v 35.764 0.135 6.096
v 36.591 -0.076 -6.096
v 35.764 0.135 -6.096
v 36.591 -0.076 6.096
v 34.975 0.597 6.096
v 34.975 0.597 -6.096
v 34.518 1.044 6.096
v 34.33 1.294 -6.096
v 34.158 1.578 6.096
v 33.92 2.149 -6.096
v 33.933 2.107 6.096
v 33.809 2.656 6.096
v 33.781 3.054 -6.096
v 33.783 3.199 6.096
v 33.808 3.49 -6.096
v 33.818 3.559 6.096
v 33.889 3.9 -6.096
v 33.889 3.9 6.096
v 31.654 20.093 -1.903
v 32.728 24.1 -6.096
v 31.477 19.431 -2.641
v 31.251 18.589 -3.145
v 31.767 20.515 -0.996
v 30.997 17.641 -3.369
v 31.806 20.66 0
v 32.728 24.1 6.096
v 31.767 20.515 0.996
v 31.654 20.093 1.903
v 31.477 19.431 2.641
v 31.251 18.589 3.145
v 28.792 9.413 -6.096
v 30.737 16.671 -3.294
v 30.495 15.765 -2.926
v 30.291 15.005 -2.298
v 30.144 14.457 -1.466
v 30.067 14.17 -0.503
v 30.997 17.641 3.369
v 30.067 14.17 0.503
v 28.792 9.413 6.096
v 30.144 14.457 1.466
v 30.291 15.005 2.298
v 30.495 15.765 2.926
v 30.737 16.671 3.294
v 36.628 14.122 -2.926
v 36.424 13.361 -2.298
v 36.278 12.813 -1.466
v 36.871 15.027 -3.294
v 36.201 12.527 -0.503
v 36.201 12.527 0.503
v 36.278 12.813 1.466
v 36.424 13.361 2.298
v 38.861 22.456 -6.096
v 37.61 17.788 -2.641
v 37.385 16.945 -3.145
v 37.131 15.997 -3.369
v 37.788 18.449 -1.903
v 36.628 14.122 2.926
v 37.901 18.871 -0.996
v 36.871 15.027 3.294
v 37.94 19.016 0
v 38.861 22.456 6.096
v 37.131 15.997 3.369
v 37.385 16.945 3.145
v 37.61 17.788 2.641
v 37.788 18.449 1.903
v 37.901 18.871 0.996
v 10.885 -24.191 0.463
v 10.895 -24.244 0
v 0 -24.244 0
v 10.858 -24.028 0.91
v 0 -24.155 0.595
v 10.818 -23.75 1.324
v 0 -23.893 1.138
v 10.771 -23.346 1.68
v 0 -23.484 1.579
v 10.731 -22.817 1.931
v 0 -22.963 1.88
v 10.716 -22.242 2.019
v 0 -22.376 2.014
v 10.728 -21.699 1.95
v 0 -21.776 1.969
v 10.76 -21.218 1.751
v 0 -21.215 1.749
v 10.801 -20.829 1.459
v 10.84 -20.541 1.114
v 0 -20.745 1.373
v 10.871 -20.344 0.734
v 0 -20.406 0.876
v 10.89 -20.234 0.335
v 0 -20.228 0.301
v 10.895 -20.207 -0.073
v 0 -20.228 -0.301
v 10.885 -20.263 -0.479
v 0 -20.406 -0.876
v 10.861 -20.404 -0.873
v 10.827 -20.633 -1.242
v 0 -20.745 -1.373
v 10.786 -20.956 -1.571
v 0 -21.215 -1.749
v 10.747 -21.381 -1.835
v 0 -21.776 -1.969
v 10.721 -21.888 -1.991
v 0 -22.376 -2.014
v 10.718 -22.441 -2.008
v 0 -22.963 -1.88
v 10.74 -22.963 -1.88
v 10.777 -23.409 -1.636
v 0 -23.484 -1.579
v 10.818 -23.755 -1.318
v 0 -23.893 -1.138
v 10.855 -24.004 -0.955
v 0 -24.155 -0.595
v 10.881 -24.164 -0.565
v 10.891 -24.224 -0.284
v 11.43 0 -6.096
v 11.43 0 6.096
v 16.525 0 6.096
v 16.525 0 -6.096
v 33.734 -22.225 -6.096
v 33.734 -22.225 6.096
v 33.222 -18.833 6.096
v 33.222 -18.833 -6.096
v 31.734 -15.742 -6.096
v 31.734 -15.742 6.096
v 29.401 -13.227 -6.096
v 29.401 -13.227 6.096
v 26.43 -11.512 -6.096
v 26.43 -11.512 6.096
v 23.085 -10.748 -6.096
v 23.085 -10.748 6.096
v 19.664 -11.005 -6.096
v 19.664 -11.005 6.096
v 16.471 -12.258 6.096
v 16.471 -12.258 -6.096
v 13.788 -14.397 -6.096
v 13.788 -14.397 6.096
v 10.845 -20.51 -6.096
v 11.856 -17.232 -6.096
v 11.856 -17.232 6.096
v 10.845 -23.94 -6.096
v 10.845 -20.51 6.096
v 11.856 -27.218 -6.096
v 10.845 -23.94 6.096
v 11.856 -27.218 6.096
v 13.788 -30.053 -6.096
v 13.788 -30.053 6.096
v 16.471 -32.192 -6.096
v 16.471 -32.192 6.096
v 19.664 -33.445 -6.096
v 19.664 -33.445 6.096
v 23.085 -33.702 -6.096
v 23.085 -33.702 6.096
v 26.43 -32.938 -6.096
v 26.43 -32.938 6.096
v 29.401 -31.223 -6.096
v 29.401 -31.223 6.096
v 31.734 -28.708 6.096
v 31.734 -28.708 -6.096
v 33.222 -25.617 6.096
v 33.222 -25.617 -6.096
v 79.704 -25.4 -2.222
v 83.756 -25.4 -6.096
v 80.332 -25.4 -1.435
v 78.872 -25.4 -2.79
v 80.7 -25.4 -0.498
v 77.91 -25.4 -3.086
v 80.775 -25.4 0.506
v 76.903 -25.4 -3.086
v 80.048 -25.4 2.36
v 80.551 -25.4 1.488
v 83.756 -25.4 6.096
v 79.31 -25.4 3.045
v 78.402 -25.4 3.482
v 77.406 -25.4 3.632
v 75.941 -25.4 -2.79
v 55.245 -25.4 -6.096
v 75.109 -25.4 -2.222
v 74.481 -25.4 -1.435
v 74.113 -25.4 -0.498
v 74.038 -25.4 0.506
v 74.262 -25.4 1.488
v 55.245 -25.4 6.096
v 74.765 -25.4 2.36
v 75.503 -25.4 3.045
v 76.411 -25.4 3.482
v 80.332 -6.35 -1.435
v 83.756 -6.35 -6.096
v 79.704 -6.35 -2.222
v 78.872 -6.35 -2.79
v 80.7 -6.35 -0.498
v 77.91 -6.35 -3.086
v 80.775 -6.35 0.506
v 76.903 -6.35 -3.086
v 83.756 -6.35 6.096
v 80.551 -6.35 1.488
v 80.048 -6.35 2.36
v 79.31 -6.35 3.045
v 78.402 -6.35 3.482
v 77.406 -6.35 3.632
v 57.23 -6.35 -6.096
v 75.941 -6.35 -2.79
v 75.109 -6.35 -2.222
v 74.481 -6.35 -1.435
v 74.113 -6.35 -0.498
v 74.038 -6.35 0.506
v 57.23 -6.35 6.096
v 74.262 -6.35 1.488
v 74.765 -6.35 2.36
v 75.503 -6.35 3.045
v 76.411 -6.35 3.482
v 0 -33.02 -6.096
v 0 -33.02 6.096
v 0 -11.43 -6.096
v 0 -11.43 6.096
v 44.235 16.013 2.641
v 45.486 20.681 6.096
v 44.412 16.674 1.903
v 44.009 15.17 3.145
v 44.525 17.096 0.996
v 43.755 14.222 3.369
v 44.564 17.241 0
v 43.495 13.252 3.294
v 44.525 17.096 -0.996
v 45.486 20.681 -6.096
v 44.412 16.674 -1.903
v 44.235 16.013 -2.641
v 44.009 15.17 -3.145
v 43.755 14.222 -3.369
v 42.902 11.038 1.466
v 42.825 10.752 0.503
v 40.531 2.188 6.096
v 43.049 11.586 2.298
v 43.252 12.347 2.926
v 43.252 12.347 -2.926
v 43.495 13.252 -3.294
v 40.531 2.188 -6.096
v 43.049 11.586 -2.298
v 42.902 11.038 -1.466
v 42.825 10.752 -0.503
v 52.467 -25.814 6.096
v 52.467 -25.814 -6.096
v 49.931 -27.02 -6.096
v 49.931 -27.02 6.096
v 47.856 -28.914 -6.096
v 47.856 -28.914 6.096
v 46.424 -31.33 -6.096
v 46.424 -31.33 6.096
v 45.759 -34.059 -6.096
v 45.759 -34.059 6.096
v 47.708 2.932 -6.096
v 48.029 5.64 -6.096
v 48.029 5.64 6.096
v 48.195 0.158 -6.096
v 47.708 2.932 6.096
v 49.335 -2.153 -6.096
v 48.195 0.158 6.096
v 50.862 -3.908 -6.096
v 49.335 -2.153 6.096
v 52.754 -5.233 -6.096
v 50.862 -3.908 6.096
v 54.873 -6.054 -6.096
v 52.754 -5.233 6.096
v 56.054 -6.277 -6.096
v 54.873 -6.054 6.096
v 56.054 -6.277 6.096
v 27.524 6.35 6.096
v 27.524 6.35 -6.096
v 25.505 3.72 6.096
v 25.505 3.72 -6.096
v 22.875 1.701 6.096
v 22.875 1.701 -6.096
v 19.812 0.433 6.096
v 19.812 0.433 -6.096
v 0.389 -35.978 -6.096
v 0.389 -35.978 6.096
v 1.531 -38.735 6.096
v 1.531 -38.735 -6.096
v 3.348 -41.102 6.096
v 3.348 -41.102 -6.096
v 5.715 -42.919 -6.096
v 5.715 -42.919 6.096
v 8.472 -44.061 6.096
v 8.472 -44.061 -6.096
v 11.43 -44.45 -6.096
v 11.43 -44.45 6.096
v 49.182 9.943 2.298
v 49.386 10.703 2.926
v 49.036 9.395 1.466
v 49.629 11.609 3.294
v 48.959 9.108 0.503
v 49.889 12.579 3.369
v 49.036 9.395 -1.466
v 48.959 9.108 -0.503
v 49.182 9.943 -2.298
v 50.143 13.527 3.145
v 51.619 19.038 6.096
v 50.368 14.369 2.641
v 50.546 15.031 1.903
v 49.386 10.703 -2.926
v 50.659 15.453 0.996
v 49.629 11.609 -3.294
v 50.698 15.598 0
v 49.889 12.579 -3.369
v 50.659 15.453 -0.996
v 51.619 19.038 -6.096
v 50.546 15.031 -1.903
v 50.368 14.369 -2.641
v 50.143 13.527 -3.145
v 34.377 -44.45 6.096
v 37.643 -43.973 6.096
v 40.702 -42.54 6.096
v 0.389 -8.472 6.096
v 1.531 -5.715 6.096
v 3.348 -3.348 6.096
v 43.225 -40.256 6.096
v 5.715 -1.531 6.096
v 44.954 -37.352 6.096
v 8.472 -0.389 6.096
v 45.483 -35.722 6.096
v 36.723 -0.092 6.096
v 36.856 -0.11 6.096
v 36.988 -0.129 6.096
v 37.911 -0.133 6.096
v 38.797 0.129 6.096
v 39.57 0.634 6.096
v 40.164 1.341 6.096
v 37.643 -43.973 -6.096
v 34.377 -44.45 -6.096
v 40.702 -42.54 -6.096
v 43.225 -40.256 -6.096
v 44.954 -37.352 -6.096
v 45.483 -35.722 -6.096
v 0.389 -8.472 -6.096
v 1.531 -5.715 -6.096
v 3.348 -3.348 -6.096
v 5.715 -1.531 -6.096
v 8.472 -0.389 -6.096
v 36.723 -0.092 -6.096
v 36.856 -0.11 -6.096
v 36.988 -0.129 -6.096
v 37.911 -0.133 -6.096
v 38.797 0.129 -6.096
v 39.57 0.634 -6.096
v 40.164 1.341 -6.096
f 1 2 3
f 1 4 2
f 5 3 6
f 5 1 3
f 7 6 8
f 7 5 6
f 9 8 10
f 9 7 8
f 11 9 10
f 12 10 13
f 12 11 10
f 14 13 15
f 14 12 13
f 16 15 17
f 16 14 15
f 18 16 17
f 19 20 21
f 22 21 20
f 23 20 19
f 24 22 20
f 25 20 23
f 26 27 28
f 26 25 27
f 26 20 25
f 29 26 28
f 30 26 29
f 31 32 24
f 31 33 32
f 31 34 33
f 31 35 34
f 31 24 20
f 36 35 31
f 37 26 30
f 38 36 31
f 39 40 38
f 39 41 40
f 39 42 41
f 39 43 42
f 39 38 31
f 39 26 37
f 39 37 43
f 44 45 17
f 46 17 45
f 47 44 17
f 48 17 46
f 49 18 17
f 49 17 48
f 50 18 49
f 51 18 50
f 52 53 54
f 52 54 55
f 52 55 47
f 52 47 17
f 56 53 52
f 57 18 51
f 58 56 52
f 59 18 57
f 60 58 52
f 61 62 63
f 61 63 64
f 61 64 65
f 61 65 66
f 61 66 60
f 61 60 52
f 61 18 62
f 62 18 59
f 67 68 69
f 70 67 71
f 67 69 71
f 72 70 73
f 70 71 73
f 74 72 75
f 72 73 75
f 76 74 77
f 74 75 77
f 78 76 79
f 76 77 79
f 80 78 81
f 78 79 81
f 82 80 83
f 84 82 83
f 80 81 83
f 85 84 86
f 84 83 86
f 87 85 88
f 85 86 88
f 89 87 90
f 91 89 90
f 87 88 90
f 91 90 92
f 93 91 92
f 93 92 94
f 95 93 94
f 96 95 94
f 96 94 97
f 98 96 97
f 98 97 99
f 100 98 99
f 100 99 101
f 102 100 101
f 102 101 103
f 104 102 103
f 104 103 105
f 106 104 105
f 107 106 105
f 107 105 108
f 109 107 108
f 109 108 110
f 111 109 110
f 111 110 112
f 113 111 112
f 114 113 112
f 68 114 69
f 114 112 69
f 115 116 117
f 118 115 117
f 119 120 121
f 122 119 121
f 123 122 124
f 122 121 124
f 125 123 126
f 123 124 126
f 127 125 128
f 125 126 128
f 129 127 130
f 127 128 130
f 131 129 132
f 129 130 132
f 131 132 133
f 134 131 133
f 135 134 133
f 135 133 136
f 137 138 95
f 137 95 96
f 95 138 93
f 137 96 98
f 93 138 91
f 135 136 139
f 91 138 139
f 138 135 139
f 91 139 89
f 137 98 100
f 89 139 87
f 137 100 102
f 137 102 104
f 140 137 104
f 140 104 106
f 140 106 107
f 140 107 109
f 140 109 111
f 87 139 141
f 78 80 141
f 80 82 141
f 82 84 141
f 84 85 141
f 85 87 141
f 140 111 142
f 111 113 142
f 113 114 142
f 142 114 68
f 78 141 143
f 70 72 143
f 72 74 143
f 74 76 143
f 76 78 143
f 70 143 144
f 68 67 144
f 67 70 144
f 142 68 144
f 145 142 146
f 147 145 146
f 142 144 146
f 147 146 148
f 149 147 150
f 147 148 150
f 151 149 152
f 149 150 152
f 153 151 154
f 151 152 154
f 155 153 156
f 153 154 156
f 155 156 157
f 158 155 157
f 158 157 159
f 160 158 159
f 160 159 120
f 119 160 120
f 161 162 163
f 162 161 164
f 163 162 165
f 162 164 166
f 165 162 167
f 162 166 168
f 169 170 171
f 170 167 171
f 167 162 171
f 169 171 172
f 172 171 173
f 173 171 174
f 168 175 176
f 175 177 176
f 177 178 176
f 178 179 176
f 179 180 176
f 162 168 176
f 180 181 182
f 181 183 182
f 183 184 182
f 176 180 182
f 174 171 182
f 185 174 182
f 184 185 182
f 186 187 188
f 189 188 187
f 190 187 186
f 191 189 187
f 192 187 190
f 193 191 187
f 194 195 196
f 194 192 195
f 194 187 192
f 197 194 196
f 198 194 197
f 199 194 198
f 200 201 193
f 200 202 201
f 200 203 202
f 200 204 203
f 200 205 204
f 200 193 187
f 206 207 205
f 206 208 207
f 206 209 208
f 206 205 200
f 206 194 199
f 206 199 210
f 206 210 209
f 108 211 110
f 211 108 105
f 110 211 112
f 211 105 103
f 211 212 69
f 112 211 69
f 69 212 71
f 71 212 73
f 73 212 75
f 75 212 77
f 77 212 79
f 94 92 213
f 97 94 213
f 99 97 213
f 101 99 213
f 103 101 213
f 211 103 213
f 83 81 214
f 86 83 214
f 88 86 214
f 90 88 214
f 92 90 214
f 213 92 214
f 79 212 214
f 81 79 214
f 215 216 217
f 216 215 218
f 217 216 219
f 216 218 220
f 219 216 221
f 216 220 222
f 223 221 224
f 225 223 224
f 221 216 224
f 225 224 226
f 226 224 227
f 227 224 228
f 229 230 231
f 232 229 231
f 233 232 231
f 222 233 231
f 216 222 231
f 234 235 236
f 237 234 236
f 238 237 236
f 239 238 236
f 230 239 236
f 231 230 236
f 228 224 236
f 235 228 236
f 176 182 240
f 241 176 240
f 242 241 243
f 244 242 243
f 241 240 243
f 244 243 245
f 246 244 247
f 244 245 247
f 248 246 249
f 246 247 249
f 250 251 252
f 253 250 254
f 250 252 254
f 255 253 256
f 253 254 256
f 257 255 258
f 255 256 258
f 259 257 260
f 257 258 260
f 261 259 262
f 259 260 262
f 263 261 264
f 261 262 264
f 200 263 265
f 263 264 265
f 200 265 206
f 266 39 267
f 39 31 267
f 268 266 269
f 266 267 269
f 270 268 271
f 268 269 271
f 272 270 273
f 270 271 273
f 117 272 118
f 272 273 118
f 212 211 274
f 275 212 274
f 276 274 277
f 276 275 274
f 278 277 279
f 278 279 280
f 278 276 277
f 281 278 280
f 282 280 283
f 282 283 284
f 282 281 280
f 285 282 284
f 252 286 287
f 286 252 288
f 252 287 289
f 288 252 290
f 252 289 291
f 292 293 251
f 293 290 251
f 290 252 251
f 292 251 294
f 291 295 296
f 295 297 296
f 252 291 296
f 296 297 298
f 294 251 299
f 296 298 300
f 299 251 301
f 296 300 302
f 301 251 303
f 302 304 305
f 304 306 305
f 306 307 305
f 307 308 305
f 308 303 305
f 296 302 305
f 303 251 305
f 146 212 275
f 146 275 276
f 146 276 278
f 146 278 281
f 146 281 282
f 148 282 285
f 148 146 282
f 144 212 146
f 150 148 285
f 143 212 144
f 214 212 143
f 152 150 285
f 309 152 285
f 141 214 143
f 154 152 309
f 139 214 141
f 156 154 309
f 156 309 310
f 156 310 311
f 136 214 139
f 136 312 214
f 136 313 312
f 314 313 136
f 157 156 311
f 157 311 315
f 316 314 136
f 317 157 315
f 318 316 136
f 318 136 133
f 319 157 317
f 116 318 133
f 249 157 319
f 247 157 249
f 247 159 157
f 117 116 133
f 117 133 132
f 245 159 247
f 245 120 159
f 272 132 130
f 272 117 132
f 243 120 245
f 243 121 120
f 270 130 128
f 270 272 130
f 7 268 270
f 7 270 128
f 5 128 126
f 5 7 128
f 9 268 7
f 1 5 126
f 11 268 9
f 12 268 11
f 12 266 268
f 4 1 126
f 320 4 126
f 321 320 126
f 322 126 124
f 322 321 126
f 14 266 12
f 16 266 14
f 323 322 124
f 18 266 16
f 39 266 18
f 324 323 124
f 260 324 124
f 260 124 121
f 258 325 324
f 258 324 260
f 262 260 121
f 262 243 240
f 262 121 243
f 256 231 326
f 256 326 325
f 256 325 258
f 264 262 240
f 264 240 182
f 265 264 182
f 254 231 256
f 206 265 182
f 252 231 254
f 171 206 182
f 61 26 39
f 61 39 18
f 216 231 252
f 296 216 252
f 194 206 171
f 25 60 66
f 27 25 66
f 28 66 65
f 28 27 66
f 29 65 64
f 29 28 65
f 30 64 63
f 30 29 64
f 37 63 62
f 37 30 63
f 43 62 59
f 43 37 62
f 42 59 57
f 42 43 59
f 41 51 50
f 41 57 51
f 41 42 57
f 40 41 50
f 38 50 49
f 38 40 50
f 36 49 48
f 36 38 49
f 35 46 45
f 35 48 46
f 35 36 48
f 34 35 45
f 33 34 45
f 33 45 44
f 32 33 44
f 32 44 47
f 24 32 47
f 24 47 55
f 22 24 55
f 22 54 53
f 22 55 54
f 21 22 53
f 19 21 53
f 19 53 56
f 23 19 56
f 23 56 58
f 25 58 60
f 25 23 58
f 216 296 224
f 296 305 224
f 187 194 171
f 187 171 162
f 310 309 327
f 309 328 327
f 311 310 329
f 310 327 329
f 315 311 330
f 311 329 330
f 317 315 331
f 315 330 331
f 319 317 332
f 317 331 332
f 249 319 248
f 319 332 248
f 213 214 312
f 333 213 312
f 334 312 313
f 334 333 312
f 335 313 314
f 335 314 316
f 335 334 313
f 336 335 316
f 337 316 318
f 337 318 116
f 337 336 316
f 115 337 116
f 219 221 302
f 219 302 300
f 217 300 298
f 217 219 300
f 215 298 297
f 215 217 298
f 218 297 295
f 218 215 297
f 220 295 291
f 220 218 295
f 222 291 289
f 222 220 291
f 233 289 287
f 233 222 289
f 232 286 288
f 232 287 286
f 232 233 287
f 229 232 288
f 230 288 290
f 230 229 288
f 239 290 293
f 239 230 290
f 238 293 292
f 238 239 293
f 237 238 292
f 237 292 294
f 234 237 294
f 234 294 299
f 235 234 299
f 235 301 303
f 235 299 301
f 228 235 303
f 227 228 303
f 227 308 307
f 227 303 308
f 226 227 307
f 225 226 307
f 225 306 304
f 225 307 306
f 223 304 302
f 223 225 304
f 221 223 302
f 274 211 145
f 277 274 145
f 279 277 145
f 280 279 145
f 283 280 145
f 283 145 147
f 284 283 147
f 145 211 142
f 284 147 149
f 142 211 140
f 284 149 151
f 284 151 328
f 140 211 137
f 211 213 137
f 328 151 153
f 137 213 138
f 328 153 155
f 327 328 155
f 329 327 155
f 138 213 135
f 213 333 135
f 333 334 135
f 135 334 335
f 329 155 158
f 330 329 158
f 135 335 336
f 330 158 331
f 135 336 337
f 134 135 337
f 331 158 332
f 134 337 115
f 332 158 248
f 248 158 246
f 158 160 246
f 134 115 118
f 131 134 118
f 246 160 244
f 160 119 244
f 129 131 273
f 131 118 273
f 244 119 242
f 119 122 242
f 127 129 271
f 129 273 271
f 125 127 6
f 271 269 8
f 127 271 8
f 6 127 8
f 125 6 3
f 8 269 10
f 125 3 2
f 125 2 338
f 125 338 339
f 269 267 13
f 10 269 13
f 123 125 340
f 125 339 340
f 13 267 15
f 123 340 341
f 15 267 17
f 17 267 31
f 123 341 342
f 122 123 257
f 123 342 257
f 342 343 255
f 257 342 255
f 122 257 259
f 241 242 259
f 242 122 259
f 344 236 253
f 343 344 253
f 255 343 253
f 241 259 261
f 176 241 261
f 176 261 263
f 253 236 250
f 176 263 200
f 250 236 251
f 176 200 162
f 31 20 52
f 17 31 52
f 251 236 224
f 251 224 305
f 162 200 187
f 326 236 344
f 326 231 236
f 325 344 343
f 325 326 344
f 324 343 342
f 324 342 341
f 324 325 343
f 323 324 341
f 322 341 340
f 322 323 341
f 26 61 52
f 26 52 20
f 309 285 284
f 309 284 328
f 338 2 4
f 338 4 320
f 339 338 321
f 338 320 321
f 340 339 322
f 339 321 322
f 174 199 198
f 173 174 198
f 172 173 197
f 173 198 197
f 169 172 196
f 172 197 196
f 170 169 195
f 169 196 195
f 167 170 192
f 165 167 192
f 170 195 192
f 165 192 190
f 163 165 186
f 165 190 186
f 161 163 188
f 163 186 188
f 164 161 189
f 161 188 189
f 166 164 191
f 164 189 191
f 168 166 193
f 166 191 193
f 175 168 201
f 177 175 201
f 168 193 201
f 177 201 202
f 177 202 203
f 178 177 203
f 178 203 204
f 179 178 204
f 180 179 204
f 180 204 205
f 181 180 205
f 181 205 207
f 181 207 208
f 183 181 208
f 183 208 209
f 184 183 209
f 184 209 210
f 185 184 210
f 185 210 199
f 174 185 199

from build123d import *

# Parameters (mm, degrees)
SKETCH1_W                = 96.52
SKETCH1_H                = 44.45
BOSS_EXTRUDE1_DEPTH      = 6.096
CUT_EXTRUDE1_REACH       = 108.961
SKETCH2_R                = 11.50874
CUT_EXTRUDE2_REACH       = 108.438
SKETCH3_R                = 3.3782
CUT_EXTRUDE3_REACH       = 108.961
SKETCH7_W                = 12.7635
SKETCH7_H                = 12.192
CUT_EXTRUDE5_DEPTH       = 104.946532487
FILLET1_R                = 11.43
CUT_EXTRUDE9_REACH       = 97.016
CUT_EXTRUDE9_END_RADIUS  = 11.50874
SKETCH11_R               = 2.0193
BOSS_EXTRUDE2_DEPTH      = 6.096
FILLET2_R                = 3.175
FILLET3_R                = 12.7
FILLET4_R                = 9.525
CUT_EXTRUDE10_DEPTH      = 57.546170308
CUT_EXTRUDE10_DEPTH_BACK = 57.546170308
SKETCH15_R               = 3.3782


with BuildPart() as part:
    # Sketch1 → Boss-Extrude1 (new, symmetric)
    with BuildSketch(Plane.XY):
        with Locations((48.26, -22.225)):
            Rectangle(SKETCH1_W, SKETCH1_H)
    extrude(amount=BOSS_EXTRUDE1_DEPTH, both=True)

    # Sketch2 → Cut-Extrude1 (cut, up to next)
    with BuildSketch(Plane.XY.offset(6.096), mode=Mode.PRIVATE) as cut_extrude1_sk1:
        with Locations((22.225, -22.225)):
            Circle(SKETCH2_R)
    cut_extrude1_tool1 = extrude(cut_extrude1_sk1.sketch, amount=-CUT_EXTRUDE1_REACH, mode=Mode.PRIVATE) & part.part
    add(cut_extrude1_tool1.solids().sort_by_distance((22.225, -22.225, 6.096))[0], mode=Mode.SUBTRACT)

    # Sketch3 → Cut-Extrude2 (cut, up to next)
    with BuildSketch(Plane(origin=(0, 0, 0), x_dir=(1, 0, 0), z_dir=(0, 1, 0)), mode=Mode.PRIVATE) as cut_extrude2_sk1:
        with Locations(Location((77.4065, -0.254, 0), (0, 0, 270))):
            Circle(SKETCH3_R)
    cut_extrude2_tool1 = extrude(cut_extrude2_sk1.sketch, amount=-CUT_EXTRUDE2_REACH, mode=Mode.PRIVATE) & part.part
    add(cut_extrude2_tool1.solids().sort_by_distance((77.4065, 0, 0.254))[0], mode=Mode.SUBTRACT)

    # Sketch4 → Cut-Extrude3 (cut, up to next)
    with BuildSketch(Plane.XY.offset(6.096), mode=Mode.PRIVATE) as cut_extrude3_sk1:
        with BuildLine():
            Line((48.895, 6.35), (96.52, 6.35))
            ThreePointArc((96.52, 6.35), (102.87, 0), (96.52, -6.35))
            Line((96.52, -6.35), (48.895, -6.35))
            ThreePointArc((48.895, -6.35), (42.545, 0), (48.895, 6.35))
        make_face()
    cut_extrude3_tool1 = extrude(cut_extrude3_sk1.sketch, amount=-CUT_EXTRUDE3_REACH, mode=Mode.PRIVATE) & part.part
    # Sketch4 → Cut-Extrude3 (cut, up to next)
    with BuildSketch(Plane.XY.offset(6.096), mode=Mode.PRIVATE) as cut_extrude3_sk2:
        with BuildLine():
            Line((45.72, -34.925), (45.72, -44.45))
            Line((45.72, -44.45), (55.245, -44.45))
            Line((55.245, -44.45), (96.52, -44.45))
            ThreePointArc((96.52, -44.45), (106.045, -34.925), (96.52, -25.4))
            Line((96.52, -25.4), (55.245, -25.4))
            ThreePointArc((55.245, -25.4), (48.509807909, -28.189807909), (45.72, -34.925))
        make_face()
    cut_extrude3_tool2 = extrude(cut_extrude3_sk2.sketch, amount=-CUT_EXTRUDE3_REACH, mode=Mode.PRIVATE) & part.part
    add(cut_extrude3_tool1.solids().sort_by_distance((72.7075, 0, 6.096))[0], mode=Mode.SUBTRACT)
    add(cut_extrude3_tool2.solids().sort_by_distance((75.382091, -35.05704, 6.096))[0], mode=Mode.SUBTRACT)

    # Sketch7 → Cut-Extrude5 (cut, through all)
    with BuildSketch(Plane(origin=(0, -6.35, 0), x_dir=(1, 0, 0), z_dir=(0, 1, 0))):
        with Locations((90.13825, 0)):
            Rectangle(SKETCH7_W, SKETCH7_H)
    extrude(amount=-CUT_EXTRUDE5_DEPTH, mode=Mode.SUBTRACT)

    # Fillet1
    fillet1_edges = [part.edges().sort_by_distance(p)[0] for p in [
        (42.545, 0, 0),
        (45.72, -44.45, 0),
        (0, -44.45, 0),
        (0, 0, 0),
    ]]
    fillet(fillet1_edges, radius=FILLET1_R)

    # Cut-Extrude9: up to this cylinder (the profile starts outside it)
    cut_extrude9_end = Plane(origin=(22.225, -22.225, 0), z_dir=(0, 0, 1)) * Cylinder(CUT_EXTRUDE9_END_RADIUS, 218.04948, mode=Mode.PRIVATE)
    # Sketch11 → Cut-Extrude9 (cut, up to the surface)
    with BuildSketch(Plane.ZY, mode=Mode.PRIVATE) as cut_extrude9_sk1:
        with Locations(Location((0, -22.225, 0), (0, 0, 270))):
            Circle(SKETCH11_R)
    cut_extrude9_tool1 = extrude(cut_extrude9_sk1.sketch, amount=-CUT_EXTRUDE9_REACH, mode=Mode.PRIVATE) - cut_extrude9_end
    add(cut_extrude9_tool1.solids().sort_by_distance((0, -22.225, 0))[0], mode=Mode.SUBTRACT)

    # Sketch14 → Boss-Extrude2 (add, symmetric)
    with BuildSketch(Plane.XY):
        Polygon((45.045272578, -5.496900798), (51.619276324, 19.03761519), (45.485647327, 20.681116126), (38.911643582, -3.853399862), align=None)
        Polygon((26.270231172, 0), (32.844234917, 0), (38.86132801, 22.456097137), (32.727699014, 24.099598074), align=None)
    extrude(amount=BOSS_EXTRUDE2_DEPTH, both=True)

    # Fillet2
    fillet2_edges = [part.edges().sort_by_distance(p)[0] for p in [
        (32.844234917, 0, 0),
        (39.704874489, -0.893021814, 0),
    ]]
    fillet(fillet2_edges, radius=FILLET2_R)

    # Fillet3
    fillet3_edges = [part.edges().sort_by_distance(p)[0] for p in [
        (26.270231172, 0, 0),
    ]]
    fillet(fillet3_edges, radius=FILLET3_R)

    # Fillet4
    fillet4_edges = [part.edges().sort_by_distance(p)[0] for p in [
        (45.14505865, -5.124494109, 0),
    ]]
    fillet(fillet4_edges, radius=FILLET4_R)

    # Sketch15 → Cut-Extrude10 (cut, two sides: drawn at the far end of the back side and taken through both)
    with BuildSketch(Plane(origin=(43.402036675, -11.629540677, 0), x_dir=(0, 0, -1), z_dir=(0.9659258262890672, -0.25881904510252485, 0)).offset(-CUT_EXTRUDE10_DEPTH_BACK)):
        with Locations(Location((0, 24.80969599, 0), (0, 0, 90))):
            Circle(SKETCH15_R)
    extrude(amount=CUT_EXTRUDE10_DEPTH + CUT_EXTRUDE10_DEPTH_BACK, mode=Mode.SUBTRACT)


solid = part.part
